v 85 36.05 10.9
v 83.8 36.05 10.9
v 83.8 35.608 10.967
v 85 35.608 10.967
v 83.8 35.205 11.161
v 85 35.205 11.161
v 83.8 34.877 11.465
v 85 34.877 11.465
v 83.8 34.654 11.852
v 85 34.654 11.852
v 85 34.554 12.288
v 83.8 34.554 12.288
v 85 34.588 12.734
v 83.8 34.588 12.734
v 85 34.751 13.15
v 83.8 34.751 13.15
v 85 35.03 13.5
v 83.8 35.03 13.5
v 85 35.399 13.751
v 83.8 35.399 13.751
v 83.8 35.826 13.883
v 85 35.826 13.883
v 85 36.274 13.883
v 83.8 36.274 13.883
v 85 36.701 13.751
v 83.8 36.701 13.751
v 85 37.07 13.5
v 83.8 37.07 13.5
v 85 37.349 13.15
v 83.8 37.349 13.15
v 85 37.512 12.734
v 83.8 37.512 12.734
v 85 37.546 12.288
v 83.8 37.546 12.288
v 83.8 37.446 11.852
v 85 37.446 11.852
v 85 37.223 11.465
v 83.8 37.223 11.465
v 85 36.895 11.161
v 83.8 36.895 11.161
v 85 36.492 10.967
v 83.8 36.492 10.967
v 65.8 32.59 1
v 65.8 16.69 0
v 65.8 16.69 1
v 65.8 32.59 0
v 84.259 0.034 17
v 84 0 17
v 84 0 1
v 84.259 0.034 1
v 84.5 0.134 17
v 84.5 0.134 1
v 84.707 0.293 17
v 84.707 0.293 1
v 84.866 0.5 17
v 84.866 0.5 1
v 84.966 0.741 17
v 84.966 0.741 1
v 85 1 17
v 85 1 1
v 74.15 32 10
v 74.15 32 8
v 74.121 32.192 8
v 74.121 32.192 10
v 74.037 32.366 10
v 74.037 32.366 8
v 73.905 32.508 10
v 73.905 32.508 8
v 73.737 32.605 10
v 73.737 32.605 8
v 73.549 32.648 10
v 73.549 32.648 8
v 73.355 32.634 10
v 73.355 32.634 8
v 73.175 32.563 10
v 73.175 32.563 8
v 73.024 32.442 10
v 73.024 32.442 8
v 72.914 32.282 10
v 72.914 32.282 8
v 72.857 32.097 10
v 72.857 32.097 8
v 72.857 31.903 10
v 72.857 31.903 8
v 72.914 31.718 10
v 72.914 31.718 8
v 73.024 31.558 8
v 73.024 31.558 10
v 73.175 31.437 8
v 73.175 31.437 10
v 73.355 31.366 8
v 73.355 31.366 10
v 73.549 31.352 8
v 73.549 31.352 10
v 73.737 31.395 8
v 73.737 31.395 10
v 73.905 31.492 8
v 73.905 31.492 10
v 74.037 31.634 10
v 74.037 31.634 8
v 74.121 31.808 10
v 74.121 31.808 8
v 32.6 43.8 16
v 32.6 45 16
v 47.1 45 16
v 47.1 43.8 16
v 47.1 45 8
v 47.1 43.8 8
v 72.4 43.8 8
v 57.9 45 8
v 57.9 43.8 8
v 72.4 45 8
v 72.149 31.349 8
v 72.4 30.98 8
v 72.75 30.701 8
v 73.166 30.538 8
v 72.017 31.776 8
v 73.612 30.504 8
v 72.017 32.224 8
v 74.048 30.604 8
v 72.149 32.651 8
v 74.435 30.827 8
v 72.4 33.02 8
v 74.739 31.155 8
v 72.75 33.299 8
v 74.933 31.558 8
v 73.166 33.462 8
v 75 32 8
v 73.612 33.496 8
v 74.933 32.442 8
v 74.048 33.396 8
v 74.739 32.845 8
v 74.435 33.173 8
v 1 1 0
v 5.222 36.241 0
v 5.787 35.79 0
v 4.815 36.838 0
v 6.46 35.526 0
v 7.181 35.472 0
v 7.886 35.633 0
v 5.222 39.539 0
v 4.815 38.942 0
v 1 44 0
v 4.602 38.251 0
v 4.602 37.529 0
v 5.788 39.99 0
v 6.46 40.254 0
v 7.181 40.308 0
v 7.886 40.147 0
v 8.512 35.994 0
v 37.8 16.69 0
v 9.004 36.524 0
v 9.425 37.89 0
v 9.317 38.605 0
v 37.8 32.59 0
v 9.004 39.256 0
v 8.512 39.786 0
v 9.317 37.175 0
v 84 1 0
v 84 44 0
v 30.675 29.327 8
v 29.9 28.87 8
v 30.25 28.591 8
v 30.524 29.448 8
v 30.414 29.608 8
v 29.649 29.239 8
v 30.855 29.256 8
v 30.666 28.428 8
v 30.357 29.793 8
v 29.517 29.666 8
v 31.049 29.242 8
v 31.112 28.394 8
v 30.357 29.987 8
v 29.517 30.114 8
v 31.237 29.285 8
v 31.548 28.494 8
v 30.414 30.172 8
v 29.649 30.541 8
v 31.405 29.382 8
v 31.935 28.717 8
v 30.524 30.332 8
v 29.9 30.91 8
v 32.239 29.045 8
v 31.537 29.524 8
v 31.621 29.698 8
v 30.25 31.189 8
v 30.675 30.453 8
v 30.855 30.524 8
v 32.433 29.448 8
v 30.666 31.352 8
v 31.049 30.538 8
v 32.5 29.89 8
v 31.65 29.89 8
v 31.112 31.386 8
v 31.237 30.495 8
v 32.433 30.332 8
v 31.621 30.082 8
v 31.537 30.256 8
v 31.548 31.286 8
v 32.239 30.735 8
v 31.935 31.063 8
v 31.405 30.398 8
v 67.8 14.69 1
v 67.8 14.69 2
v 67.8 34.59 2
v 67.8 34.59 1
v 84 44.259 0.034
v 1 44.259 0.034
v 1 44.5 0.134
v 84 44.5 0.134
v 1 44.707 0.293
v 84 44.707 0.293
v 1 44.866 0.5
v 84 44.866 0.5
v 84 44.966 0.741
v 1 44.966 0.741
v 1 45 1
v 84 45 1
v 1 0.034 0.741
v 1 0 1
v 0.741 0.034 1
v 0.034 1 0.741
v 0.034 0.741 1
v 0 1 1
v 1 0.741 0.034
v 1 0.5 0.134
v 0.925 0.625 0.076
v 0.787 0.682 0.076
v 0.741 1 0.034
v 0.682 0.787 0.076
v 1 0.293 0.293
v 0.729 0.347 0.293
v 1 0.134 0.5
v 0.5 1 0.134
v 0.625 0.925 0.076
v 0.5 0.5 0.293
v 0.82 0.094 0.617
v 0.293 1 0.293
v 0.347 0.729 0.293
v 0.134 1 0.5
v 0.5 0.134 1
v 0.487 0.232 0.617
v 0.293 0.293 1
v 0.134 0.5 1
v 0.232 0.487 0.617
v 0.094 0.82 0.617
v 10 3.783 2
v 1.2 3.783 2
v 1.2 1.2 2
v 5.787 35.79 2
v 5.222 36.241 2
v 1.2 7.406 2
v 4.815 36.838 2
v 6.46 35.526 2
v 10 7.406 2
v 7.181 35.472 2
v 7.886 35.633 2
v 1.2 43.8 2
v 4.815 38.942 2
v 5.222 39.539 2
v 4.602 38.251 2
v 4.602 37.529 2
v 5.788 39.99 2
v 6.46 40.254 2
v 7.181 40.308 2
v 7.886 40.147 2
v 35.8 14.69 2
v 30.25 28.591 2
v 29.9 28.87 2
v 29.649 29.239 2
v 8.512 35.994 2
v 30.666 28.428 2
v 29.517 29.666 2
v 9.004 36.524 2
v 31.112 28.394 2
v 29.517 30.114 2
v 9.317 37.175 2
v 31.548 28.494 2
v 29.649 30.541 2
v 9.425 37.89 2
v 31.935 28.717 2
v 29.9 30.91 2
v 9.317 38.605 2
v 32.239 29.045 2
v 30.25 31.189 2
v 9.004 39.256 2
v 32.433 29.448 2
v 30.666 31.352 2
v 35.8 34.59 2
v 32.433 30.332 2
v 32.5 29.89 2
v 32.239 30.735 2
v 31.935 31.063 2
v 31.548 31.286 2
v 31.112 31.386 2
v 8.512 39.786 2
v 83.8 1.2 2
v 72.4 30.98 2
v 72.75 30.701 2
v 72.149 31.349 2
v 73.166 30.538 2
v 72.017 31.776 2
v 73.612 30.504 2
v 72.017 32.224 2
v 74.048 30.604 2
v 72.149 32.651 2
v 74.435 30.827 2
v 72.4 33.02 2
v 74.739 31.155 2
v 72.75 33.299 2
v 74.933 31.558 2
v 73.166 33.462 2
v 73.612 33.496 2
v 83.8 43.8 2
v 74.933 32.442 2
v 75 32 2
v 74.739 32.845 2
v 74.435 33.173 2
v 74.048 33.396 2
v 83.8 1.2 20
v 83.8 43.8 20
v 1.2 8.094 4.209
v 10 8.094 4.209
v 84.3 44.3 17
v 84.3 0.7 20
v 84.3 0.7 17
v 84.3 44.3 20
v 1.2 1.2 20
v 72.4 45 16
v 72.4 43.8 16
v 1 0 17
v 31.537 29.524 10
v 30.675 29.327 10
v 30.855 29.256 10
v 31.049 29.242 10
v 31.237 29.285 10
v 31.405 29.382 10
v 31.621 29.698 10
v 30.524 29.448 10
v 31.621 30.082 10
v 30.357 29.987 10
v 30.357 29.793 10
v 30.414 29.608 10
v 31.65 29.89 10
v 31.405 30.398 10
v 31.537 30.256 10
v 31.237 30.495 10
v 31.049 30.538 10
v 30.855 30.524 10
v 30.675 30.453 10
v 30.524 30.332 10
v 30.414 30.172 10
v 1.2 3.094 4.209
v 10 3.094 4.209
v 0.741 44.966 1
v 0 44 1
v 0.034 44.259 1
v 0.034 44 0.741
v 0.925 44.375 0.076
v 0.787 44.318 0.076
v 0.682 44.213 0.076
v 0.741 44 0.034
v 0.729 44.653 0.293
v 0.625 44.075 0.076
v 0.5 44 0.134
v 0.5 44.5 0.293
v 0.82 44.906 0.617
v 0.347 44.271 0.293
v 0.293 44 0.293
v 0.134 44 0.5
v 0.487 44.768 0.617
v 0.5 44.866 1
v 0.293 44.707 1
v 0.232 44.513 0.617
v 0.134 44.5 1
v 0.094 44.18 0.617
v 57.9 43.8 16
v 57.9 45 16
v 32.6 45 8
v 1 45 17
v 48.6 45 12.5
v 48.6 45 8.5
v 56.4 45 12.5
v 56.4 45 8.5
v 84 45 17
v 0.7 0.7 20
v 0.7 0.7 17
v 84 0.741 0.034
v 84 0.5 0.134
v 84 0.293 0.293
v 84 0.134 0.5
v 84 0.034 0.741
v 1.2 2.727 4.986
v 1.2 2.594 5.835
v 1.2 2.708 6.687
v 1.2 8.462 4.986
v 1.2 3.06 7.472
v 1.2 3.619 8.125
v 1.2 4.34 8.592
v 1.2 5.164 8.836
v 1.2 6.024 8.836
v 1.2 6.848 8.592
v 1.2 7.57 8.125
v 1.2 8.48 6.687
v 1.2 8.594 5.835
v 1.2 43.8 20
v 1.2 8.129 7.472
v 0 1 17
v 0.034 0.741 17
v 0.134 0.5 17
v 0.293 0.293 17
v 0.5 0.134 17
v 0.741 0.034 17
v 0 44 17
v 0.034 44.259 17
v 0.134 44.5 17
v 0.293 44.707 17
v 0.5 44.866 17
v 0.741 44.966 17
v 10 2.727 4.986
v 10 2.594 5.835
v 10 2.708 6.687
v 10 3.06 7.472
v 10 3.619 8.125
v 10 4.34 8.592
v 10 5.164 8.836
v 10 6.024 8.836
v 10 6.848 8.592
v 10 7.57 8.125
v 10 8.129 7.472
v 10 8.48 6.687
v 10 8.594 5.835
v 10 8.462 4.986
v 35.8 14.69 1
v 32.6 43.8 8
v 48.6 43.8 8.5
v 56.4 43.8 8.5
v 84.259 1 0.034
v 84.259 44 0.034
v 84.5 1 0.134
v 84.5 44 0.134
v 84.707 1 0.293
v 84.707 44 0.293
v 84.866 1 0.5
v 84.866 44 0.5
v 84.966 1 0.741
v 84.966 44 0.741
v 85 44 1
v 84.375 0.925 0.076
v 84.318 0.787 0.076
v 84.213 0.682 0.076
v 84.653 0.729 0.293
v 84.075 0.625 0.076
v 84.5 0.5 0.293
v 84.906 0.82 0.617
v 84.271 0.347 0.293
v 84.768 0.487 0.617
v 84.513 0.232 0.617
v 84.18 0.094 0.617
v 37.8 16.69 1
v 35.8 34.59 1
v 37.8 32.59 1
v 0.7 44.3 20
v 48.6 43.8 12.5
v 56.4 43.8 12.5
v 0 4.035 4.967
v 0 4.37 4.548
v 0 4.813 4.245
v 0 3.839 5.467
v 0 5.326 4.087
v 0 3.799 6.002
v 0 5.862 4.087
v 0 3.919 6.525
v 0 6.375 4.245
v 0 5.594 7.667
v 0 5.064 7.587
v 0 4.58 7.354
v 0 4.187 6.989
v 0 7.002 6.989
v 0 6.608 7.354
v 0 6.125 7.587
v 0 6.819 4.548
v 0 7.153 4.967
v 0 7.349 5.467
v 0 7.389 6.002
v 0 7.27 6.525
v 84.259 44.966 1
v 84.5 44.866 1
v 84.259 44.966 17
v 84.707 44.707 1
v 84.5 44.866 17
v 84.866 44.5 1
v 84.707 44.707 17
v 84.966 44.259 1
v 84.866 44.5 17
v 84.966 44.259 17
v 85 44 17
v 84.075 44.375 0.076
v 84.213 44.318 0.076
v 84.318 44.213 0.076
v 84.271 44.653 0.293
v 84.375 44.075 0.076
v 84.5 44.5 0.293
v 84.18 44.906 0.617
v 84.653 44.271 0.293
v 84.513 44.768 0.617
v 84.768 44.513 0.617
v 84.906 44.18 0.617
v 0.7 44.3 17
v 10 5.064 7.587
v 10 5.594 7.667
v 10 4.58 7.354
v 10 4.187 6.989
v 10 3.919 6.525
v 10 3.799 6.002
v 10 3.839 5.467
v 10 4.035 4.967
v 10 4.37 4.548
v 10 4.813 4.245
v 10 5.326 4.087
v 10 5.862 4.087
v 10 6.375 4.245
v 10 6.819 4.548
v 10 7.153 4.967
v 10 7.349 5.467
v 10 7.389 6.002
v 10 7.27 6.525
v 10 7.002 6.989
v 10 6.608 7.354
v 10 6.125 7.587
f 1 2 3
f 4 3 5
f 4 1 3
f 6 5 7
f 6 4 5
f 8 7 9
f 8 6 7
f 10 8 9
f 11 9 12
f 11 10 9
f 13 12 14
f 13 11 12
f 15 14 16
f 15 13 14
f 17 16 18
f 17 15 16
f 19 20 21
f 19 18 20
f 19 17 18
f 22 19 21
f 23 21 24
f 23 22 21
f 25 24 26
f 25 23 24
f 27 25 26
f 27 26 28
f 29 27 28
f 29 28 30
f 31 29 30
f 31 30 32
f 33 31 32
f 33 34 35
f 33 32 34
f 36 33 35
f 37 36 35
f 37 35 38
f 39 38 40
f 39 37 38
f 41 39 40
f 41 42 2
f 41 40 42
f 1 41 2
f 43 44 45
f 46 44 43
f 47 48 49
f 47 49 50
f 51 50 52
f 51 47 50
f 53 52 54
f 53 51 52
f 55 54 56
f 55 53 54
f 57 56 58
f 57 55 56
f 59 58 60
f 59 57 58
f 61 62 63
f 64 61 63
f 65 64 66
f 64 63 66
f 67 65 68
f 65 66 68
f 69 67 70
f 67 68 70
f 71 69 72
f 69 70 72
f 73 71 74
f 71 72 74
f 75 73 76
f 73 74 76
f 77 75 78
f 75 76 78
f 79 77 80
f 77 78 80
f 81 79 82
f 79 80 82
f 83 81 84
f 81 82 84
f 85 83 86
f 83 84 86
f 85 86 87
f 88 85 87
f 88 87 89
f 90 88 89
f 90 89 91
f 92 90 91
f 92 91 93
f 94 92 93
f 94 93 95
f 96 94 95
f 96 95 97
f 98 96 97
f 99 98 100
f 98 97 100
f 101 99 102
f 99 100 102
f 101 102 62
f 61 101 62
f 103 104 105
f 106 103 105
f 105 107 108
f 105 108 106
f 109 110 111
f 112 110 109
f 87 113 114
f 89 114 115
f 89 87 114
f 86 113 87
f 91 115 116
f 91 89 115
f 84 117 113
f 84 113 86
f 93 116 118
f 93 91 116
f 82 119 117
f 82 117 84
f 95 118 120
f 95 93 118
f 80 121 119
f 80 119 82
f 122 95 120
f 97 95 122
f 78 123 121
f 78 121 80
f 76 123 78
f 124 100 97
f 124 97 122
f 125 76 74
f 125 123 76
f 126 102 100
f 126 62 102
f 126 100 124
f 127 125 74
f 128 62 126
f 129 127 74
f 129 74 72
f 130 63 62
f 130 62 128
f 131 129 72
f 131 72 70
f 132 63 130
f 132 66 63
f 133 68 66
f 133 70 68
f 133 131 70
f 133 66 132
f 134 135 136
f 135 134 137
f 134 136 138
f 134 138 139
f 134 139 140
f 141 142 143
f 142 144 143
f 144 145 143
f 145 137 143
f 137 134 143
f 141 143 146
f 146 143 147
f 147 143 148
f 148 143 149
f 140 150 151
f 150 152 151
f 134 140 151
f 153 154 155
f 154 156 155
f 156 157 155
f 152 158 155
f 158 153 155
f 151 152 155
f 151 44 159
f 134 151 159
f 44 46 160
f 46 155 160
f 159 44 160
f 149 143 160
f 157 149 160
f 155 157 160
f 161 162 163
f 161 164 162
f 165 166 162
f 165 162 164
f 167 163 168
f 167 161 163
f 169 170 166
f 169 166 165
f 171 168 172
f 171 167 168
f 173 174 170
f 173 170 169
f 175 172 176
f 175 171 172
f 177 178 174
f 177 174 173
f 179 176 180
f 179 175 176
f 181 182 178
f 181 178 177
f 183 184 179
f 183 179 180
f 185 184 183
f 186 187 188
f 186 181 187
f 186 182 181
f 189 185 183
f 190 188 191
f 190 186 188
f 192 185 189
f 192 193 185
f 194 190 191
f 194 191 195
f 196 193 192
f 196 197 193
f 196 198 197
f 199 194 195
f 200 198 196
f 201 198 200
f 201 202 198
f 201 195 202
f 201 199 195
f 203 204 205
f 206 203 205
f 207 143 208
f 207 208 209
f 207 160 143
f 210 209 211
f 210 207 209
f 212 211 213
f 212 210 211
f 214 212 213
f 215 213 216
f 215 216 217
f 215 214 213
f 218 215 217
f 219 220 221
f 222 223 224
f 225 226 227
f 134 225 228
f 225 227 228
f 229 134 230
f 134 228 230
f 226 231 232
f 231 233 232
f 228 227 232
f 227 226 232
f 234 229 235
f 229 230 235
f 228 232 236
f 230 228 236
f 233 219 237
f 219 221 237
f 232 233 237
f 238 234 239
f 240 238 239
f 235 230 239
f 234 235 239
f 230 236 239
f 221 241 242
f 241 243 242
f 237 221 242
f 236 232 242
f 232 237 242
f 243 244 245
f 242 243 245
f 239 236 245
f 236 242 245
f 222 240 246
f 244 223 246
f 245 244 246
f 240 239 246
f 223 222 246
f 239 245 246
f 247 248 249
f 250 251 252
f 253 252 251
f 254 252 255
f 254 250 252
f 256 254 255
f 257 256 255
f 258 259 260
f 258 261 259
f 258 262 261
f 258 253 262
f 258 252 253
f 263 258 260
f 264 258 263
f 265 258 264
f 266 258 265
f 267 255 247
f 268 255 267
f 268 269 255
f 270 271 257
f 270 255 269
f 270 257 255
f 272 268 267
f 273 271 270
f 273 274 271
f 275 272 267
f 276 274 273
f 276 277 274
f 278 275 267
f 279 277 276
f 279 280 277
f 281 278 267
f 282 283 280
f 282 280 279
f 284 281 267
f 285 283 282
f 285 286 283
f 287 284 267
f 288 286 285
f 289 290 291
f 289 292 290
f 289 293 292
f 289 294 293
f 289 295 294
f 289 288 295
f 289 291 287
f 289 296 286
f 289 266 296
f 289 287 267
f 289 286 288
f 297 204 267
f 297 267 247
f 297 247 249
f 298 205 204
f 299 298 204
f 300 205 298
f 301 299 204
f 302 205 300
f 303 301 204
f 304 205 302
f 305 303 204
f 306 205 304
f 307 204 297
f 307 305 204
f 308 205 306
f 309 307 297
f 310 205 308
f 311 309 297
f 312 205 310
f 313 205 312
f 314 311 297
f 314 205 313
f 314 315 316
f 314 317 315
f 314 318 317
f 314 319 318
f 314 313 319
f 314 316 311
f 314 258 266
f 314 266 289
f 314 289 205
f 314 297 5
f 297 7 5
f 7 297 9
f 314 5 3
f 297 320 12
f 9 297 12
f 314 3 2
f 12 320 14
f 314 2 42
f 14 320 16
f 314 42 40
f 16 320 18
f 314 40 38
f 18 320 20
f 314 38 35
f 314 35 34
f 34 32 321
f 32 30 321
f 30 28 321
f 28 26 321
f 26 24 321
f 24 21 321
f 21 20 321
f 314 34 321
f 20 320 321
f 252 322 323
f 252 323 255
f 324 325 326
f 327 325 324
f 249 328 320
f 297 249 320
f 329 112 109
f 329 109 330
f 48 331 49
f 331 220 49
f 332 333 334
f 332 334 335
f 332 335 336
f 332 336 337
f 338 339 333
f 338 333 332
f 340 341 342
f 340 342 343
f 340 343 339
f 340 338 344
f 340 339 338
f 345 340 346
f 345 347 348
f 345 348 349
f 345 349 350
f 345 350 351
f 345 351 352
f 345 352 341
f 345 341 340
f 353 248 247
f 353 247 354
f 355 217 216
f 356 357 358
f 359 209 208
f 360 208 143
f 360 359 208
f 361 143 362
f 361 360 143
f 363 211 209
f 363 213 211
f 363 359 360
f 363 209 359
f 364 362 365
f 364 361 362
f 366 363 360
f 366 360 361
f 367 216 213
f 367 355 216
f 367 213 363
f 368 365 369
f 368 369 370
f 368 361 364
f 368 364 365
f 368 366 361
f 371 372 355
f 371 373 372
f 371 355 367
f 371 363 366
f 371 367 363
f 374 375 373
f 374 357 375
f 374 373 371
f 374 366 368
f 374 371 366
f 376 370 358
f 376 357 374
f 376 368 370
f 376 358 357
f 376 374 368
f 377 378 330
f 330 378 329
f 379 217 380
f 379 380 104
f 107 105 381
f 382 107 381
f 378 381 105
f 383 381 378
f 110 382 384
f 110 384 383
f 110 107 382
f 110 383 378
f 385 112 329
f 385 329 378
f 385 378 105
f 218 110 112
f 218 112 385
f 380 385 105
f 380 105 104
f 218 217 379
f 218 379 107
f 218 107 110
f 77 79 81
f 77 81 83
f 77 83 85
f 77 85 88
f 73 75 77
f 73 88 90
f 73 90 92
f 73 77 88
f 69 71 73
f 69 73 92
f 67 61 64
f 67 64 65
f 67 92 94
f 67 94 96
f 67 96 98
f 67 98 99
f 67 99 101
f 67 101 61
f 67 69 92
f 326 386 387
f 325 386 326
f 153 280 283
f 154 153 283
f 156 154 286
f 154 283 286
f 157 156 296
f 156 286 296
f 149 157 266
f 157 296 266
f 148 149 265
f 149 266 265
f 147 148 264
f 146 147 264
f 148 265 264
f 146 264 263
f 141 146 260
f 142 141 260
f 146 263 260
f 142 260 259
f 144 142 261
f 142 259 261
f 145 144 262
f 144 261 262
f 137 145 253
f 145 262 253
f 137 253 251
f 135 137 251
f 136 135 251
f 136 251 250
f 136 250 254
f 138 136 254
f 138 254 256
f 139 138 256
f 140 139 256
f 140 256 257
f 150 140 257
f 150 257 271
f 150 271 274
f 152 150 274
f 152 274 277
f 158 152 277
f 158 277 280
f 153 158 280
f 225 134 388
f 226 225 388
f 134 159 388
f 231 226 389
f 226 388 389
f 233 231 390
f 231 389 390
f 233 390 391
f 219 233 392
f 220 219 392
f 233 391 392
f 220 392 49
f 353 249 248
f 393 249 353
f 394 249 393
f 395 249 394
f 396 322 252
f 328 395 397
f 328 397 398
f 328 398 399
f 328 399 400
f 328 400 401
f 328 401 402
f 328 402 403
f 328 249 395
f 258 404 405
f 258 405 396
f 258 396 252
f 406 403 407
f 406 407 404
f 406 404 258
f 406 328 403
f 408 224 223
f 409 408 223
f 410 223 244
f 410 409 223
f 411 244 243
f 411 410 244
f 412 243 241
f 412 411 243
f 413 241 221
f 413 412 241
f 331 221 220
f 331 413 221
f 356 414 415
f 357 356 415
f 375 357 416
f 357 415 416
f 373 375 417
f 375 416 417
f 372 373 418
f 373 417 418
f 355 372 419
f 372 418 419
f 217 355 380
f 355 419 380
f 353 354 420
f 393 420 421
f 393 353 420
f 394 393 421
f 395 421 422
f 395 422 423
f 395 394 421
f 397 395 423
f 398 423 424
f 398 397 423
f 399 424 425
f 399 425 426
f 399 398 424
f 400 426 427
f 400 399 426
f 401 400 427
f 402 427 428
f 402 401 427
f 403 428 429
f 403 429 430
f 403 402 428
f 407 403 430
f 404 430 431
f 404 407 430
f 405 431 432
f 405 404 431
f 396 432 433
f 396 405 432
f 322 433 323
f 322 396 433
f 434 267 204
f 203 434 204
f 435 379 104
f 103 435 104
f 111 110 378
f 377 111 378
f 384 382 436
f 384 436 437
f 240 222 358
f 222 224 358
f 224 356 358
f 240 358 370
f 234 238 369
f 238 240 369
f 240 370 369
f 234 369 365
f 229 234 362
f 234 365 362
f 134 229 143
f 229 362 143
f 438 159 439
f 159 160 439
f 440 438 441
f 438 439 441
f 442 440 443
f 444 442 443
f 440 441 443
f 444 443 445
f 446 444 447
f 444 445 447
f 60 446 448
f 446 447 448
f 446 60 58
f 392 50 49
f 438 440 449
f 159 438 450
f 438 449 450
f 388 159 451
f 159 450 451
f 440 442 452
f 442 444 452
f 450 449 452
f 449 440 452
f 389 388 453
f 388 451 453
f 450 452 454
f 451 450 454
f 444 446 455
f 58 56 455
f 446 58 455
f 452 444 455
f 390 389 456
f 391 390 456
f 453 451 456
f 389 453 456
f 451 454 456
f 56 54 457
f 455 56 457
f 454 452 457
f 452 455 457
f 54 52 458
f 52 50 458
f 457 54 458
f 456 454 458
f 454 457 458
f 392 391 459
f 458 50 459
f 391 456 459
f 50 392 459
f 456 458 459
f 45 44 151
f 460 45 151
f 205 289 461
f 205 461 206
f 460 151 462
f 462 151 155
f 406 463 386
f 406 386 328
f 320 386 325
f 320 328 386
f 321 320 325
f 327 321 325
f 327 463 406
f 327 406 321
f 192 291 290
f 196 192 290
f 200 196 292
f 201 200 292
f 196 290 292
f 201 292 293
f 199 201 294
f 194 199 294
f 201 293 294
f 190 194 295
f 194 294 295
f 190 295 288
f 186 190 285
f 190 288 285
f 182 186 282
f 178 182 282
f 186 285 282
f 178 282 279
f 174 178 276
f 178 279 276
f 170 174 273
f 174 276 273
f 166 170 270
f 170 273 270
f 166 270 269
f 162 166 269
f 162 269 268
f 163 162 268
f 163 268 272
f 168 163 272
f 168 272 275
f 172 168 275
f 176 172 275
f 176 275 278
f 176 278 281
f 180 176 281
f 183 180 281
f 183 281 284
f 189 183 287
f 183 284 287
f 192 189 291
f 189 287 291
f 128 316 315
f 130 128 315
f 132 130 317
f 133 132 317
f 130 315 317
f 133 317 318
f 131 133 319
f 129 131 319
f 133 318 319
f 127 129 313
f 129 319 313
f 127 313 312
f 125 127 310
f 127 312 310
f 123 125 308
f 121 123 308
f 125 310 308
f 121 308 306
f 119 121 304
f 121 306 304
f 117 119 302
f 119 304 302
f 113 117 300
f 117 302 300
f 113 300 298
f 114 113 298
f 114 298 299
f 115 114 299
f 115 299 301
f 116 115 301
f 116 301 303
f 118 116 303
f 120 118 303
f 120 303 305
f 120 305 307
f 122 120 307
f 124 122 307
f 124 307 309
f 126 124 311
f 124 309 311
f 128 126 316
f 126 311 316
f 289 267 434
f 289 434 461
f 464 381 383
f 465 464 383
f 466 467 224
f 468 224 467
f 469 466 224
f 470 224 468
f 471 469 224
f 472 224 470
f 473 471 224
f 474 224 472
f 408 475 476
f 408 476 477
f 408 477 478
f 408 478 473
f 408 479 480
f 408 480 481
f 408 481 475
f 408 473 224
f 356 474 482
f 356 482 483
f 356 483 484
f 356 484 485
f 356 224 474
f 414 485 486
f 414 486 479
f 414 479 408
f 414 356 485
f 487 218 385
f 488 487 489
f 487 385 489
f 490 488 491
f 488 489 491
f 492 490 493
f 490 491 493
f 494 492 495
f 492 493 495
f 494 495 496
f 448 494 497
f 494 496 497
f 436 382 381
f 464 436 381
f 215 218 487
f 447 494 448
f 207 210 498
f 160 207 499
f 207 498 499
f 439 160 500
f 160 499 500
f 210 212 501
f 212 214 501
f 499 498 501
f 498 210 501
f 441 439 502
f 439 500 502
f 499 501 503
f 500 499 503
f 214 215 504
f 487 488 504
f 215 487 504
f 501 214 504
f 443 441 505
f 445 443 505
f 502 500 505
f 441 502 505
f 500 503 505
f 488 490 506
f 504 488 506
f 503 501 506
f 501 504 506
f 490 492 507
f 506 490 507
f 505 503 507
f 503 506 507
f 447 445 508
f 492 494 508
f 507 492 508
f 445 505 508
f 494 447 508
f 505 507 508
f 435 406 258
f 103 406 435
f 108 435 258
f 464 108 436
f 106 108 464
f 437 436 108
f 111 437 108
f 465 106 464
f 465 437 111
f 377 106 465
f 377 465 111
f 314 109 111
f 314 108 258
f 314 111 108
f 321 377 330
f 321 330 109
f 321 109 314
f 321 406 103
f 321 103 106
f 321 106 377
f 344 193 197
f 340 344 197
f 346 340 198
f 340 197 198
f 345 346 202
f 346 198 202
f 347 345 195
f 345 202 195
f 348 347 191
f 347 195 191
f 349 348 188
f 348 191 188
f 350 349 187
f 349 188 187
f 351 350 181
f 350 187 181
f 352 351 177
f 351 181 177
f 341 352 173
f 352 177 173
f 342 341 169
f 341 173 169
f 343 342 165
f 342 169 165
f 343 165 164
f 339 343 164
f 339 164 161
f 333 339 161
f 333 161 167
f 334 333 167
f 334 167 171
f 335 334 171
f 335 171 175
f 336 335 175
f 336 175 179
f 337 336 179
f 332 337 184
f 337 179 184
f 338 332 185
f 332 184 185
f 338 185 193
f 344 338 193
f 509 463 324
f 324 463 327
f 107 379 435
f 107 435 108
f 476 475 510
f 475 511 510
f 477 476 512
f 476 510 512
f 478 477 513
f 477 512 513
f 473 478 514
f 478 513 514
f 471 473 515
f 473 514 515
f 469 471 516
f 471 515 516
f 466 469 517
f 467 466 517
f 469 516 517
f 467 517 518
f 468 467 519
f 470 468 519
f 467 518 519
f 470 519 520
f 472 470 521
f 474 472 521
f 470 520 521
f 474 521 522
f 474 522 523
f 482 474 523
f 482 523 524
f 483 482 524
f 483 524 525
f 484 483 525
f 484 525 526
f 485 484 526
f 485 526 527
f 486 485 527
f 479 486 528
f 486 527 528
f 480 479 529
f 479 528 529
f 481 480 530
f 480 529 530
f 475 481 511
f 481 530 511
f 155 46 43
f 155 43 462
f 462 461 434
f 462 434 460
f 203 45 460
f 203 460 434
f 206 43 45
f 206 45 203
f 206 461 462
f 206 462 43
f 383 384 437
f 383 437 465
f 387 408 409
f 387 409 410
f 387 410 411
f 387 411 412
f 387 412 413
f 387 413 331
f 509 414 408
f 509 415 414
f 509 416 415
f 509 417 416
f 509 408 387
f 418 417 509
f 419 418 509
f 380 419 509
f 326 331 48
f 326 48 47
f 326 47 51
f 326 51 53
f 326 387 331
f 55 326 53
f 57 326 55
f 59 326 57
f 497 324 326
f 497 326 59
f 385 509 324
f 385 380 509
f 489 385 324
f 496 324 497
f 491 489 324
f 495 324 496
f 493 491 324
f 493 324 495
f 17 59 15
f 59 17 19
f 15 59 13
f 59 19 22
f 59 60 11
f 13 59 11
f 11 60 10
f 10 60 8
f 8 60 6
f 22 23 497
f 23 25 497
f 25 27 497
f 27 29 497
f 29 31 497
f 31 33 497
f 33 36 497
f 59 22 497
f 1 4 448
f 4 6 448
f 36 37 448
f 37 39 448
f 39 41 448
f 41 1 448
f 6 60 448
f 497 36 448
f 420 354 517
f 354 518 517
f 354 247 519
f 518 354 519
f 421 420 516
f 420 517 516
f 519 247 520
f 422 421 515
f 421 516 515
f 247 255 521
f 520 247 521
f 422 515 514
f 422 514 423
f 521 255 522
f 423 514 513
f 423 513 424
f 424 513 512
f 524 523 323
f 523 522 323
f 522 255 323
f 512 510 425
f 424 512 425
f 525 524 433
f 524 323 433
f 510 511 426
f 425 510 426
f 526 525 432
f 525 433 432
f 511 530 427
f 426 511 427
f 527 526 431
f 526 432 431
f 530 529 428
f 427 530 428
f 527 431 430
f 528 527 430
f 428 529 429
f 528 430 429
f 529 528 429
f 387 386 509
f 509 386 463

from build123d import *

# Parameters (mm, degrees)
SKETCH_1_W          = 85
SKETCH_1_H          = 45
EXTRUDE_1_DEPTH     = 20
SKETCH_2_W          = 82.6
SKETCH_2_H          = 42.6
CUT_EXTRUDE_1_DEPTH = 18
SKETCH_3_R          = 52.564832307
SKETCH_3_W          = 83.6
SKETCH_3_H          = 43.6
CUT_EXTRUDE_2_DEPTH = 3
SKETCH_4_R          = 1.5
CUT_EXTRUDE_3_DEPTH = 10
SKETCH_6_R          = 1.5
EXTRUDE_2_DEPTH     = 6
SKETCH_7_R          = 0.65
EXTRUDE_3_DEPTH     = 2
SKETCH_5_W          = 28
SKETCH_5_H          = 15.9
CUT_EXTRUDE_4_DEPTH = 99.234413522
SKETCH_9_W          = 32
SKETCH_9_H          = 19.9
CUT_EXTRUDE_5_DEPTH = 1
SKETCH_10_W         = 14.5
SKETCH_10_H         = 8
SKETCH_10_W_2       = 7.8
SKETCH_10_H_2       = 4
CUT_EXTRUDE_6_DEPTH = 10
FILLET_1_R          = 1
SKETCH_11_R         = 1.8
EXTRUDE_4_DEPTH     = 10
SKETCH_12_R         = 1.8
CUT_EXTRUDE_7_DEPTH = 90.721792225
SKETCH_13_R         = 2.425
CUT_EXTRUDE_8_DEPTH = 98.846819059


with BuildPart() as part:
    # Эскиз1 → Бобышка-Вытянуть1 (new body)
    with BuildSketch(Plane.XY):
        with Locations((42.5, 22.5)):
            Rectangle(SKETCH_1_W, SKETCH_1_H)
    extrude(amount=EXTRUDE_1_DEPTH)

    # Эскиз2 → Вырез-Вытянуть1 (cut)
    with BuildSketch(Plane.XY.offset(20)):
        with Locations((42.5, 22.5)):
            Rectangle(SKETCH_2_W, SKETCH_2_H)
    extrude(amount=-CUT_EXTRUDE_1_DEPTH, mode=Mode.SUBTRACT)

    # Эскиз3 → Вырез-Вытянуть2 (cut)
    with BuildSketch(Plane.XY.offset(20)):
        with Locations((42.5, 22.5)):
            Circle(SKETCH_3_R)
        with Locations((42.5, 22.5)):
            Rectangle(SKETCH_3_W, SKETCH_3_H, mode=Mode.SUBTRACT)
    extrude(amount=-CUT_EXTRUDE_2_DEPTH, mode=Mode.SUBTRACT)

    # Эскиз4 → Вырез-Вытянуть3 (cut)
    with BuildSketch(Plane.ZY.offset(-85)):
        with Locations(Location((12.4, 36.05, 0), (0, 0, 180))):
            Circle(SKETCH_4_R)
    extrude(amount=CUT_EXTRUDE_3_DEPTH, mode=Mode.SUBTRACT)

    # Эскиз6 → Бобышка-Вытянуть2 (add)
    with BuildSketch(Plane.XY.offset(2)):
        with Locations((31, 29.89)):
            Circle(SKETCH_6_R)
        with Locations((73.5, 32)):
            Circle(SKETCH_6_R)
    extrude(amount=EXTRUDE_2_DEPTH)

    # Эскиз7 → Бобышка-Вытянуть3 (add)
    with BuildSketch(Plane.XY.offset(8)):
        with Locations((31, 29.89)):
            Circle(SKETCH_7_R)
        with Locations((73.5, 32)):
            Circle(SKETCH_7_R)
    extrude(amount=EXTRUDE_3_DEPTH)

    # Эскиз5 → Вырез-Вытянуть4 (cut, through all)
    with BuildSketch(Plane(origin=(0, 0, 0), x_dir=(-1, 0, 0), z_dir=(0, 0, -1))):
        with Locations((-51.8, 24.64)):
            Rectangle(SKETCH_5_W, SKETCH_5_H)
    extrude(amount=-CUT_EXTRUDE_4_DEPTH, mode=Mode.SUBTRACT)

    # Эскиз9 → Вырез-Вытянуть5 (cut)
    with BuildSketch(Plane.XY.offset(2)):
        with Locations((51.8, 24.64)):
            Rectangle(SKETCH_9_W, SKETCH_9_H)
    extrude(amount=-CUT_EXTRUDE_5_DEPTH, mode=Mode.SUBTRACT)

    # Эскиз10 → Вырез-Вытянуть6 (cut)
    with BuildSketch(Plane.XZ.offset(-45)):
        with Locations((39.85, 12)):
            Rectangle(SKETCH_10_W, SKETCH_10_H)
        with Locations((65.15, 12)):
            Rectangle(SKETCH_10_W, SKETCH_10_H)
        with Locations((52.5, 10.5)):
            Rectangle(SKETCH_10_W_2, SKETCH_10_H_2)
    extrude(amount=CUT_EXTRUDE_6_DEPTH, mode=Mode.SUBTRACT)

    # Скругление1
    fillet_1_edges = [part.edges().sort_by_distance(p)[0] for p in [
        (0, 45, 8.5),
        (85, 45, 8.5),
        (85, 0, 8.5),
        (0, 0, 8.5),
        (42.5, 45, 0),
        (85, 22.5, 0),
        (42.5, 0, 0),
        (0, 22.5, 0),
    ]]
    fillet(fillet_1_edges, radius=FILLET_1_R)

    # Эскиз11 → Бобышка-Вытянуть4 (add)
    with BuildSketch(Plane.ZY):
        with BuildLine():
            Line((1, 7.094213846), (1, 4.094213846))
            Line((1, 4.094213846), (4.208818791, 3.094213846))
            ThreePointArc((4.208818791, 3.094213846), (8.867131186, 5.594213846), (4.208818791, 8.094213846))
            Line((4.208818791, 8.094213846), (1, 7.094213846))
        make_face()
        with Locations((5.867131186, 5.594213846)):
            Circle(SKETCH_11_R, mode=Mode.SUBTRACT)
    extrude(amount=-EXTRUDE_4_DEPTH)

    # Эскиз12 → Вырез-Вытянуть7 (cut, through all)
    with BuildSketch(Plane(origin=(10, 0, 0), x_dir=(0, 0, -1), z_dir=(1, 0, 0))):
        with Locations(Location((-5.867131186, 5.594213846, 0), (0, 0, 180))):
            Circle(SKETCH_12_R)
    extrude(amount=-CUT_EXTRUDE_7_DEPTH, mode=Mode.SUBTRACT)

    # Эскиз13 → Вырез-Вытянуть8 (cut, through all)
    with BuildSketch(Plane.XY.offset(2)):
        with Locations((7, 37.89)):
            Circle(SKETCH_13_R)
    extrude(amount=-CUT_EXTRUDE_8_DEPTH, mode=Mode.SUBTRACT)


solid = part.part
